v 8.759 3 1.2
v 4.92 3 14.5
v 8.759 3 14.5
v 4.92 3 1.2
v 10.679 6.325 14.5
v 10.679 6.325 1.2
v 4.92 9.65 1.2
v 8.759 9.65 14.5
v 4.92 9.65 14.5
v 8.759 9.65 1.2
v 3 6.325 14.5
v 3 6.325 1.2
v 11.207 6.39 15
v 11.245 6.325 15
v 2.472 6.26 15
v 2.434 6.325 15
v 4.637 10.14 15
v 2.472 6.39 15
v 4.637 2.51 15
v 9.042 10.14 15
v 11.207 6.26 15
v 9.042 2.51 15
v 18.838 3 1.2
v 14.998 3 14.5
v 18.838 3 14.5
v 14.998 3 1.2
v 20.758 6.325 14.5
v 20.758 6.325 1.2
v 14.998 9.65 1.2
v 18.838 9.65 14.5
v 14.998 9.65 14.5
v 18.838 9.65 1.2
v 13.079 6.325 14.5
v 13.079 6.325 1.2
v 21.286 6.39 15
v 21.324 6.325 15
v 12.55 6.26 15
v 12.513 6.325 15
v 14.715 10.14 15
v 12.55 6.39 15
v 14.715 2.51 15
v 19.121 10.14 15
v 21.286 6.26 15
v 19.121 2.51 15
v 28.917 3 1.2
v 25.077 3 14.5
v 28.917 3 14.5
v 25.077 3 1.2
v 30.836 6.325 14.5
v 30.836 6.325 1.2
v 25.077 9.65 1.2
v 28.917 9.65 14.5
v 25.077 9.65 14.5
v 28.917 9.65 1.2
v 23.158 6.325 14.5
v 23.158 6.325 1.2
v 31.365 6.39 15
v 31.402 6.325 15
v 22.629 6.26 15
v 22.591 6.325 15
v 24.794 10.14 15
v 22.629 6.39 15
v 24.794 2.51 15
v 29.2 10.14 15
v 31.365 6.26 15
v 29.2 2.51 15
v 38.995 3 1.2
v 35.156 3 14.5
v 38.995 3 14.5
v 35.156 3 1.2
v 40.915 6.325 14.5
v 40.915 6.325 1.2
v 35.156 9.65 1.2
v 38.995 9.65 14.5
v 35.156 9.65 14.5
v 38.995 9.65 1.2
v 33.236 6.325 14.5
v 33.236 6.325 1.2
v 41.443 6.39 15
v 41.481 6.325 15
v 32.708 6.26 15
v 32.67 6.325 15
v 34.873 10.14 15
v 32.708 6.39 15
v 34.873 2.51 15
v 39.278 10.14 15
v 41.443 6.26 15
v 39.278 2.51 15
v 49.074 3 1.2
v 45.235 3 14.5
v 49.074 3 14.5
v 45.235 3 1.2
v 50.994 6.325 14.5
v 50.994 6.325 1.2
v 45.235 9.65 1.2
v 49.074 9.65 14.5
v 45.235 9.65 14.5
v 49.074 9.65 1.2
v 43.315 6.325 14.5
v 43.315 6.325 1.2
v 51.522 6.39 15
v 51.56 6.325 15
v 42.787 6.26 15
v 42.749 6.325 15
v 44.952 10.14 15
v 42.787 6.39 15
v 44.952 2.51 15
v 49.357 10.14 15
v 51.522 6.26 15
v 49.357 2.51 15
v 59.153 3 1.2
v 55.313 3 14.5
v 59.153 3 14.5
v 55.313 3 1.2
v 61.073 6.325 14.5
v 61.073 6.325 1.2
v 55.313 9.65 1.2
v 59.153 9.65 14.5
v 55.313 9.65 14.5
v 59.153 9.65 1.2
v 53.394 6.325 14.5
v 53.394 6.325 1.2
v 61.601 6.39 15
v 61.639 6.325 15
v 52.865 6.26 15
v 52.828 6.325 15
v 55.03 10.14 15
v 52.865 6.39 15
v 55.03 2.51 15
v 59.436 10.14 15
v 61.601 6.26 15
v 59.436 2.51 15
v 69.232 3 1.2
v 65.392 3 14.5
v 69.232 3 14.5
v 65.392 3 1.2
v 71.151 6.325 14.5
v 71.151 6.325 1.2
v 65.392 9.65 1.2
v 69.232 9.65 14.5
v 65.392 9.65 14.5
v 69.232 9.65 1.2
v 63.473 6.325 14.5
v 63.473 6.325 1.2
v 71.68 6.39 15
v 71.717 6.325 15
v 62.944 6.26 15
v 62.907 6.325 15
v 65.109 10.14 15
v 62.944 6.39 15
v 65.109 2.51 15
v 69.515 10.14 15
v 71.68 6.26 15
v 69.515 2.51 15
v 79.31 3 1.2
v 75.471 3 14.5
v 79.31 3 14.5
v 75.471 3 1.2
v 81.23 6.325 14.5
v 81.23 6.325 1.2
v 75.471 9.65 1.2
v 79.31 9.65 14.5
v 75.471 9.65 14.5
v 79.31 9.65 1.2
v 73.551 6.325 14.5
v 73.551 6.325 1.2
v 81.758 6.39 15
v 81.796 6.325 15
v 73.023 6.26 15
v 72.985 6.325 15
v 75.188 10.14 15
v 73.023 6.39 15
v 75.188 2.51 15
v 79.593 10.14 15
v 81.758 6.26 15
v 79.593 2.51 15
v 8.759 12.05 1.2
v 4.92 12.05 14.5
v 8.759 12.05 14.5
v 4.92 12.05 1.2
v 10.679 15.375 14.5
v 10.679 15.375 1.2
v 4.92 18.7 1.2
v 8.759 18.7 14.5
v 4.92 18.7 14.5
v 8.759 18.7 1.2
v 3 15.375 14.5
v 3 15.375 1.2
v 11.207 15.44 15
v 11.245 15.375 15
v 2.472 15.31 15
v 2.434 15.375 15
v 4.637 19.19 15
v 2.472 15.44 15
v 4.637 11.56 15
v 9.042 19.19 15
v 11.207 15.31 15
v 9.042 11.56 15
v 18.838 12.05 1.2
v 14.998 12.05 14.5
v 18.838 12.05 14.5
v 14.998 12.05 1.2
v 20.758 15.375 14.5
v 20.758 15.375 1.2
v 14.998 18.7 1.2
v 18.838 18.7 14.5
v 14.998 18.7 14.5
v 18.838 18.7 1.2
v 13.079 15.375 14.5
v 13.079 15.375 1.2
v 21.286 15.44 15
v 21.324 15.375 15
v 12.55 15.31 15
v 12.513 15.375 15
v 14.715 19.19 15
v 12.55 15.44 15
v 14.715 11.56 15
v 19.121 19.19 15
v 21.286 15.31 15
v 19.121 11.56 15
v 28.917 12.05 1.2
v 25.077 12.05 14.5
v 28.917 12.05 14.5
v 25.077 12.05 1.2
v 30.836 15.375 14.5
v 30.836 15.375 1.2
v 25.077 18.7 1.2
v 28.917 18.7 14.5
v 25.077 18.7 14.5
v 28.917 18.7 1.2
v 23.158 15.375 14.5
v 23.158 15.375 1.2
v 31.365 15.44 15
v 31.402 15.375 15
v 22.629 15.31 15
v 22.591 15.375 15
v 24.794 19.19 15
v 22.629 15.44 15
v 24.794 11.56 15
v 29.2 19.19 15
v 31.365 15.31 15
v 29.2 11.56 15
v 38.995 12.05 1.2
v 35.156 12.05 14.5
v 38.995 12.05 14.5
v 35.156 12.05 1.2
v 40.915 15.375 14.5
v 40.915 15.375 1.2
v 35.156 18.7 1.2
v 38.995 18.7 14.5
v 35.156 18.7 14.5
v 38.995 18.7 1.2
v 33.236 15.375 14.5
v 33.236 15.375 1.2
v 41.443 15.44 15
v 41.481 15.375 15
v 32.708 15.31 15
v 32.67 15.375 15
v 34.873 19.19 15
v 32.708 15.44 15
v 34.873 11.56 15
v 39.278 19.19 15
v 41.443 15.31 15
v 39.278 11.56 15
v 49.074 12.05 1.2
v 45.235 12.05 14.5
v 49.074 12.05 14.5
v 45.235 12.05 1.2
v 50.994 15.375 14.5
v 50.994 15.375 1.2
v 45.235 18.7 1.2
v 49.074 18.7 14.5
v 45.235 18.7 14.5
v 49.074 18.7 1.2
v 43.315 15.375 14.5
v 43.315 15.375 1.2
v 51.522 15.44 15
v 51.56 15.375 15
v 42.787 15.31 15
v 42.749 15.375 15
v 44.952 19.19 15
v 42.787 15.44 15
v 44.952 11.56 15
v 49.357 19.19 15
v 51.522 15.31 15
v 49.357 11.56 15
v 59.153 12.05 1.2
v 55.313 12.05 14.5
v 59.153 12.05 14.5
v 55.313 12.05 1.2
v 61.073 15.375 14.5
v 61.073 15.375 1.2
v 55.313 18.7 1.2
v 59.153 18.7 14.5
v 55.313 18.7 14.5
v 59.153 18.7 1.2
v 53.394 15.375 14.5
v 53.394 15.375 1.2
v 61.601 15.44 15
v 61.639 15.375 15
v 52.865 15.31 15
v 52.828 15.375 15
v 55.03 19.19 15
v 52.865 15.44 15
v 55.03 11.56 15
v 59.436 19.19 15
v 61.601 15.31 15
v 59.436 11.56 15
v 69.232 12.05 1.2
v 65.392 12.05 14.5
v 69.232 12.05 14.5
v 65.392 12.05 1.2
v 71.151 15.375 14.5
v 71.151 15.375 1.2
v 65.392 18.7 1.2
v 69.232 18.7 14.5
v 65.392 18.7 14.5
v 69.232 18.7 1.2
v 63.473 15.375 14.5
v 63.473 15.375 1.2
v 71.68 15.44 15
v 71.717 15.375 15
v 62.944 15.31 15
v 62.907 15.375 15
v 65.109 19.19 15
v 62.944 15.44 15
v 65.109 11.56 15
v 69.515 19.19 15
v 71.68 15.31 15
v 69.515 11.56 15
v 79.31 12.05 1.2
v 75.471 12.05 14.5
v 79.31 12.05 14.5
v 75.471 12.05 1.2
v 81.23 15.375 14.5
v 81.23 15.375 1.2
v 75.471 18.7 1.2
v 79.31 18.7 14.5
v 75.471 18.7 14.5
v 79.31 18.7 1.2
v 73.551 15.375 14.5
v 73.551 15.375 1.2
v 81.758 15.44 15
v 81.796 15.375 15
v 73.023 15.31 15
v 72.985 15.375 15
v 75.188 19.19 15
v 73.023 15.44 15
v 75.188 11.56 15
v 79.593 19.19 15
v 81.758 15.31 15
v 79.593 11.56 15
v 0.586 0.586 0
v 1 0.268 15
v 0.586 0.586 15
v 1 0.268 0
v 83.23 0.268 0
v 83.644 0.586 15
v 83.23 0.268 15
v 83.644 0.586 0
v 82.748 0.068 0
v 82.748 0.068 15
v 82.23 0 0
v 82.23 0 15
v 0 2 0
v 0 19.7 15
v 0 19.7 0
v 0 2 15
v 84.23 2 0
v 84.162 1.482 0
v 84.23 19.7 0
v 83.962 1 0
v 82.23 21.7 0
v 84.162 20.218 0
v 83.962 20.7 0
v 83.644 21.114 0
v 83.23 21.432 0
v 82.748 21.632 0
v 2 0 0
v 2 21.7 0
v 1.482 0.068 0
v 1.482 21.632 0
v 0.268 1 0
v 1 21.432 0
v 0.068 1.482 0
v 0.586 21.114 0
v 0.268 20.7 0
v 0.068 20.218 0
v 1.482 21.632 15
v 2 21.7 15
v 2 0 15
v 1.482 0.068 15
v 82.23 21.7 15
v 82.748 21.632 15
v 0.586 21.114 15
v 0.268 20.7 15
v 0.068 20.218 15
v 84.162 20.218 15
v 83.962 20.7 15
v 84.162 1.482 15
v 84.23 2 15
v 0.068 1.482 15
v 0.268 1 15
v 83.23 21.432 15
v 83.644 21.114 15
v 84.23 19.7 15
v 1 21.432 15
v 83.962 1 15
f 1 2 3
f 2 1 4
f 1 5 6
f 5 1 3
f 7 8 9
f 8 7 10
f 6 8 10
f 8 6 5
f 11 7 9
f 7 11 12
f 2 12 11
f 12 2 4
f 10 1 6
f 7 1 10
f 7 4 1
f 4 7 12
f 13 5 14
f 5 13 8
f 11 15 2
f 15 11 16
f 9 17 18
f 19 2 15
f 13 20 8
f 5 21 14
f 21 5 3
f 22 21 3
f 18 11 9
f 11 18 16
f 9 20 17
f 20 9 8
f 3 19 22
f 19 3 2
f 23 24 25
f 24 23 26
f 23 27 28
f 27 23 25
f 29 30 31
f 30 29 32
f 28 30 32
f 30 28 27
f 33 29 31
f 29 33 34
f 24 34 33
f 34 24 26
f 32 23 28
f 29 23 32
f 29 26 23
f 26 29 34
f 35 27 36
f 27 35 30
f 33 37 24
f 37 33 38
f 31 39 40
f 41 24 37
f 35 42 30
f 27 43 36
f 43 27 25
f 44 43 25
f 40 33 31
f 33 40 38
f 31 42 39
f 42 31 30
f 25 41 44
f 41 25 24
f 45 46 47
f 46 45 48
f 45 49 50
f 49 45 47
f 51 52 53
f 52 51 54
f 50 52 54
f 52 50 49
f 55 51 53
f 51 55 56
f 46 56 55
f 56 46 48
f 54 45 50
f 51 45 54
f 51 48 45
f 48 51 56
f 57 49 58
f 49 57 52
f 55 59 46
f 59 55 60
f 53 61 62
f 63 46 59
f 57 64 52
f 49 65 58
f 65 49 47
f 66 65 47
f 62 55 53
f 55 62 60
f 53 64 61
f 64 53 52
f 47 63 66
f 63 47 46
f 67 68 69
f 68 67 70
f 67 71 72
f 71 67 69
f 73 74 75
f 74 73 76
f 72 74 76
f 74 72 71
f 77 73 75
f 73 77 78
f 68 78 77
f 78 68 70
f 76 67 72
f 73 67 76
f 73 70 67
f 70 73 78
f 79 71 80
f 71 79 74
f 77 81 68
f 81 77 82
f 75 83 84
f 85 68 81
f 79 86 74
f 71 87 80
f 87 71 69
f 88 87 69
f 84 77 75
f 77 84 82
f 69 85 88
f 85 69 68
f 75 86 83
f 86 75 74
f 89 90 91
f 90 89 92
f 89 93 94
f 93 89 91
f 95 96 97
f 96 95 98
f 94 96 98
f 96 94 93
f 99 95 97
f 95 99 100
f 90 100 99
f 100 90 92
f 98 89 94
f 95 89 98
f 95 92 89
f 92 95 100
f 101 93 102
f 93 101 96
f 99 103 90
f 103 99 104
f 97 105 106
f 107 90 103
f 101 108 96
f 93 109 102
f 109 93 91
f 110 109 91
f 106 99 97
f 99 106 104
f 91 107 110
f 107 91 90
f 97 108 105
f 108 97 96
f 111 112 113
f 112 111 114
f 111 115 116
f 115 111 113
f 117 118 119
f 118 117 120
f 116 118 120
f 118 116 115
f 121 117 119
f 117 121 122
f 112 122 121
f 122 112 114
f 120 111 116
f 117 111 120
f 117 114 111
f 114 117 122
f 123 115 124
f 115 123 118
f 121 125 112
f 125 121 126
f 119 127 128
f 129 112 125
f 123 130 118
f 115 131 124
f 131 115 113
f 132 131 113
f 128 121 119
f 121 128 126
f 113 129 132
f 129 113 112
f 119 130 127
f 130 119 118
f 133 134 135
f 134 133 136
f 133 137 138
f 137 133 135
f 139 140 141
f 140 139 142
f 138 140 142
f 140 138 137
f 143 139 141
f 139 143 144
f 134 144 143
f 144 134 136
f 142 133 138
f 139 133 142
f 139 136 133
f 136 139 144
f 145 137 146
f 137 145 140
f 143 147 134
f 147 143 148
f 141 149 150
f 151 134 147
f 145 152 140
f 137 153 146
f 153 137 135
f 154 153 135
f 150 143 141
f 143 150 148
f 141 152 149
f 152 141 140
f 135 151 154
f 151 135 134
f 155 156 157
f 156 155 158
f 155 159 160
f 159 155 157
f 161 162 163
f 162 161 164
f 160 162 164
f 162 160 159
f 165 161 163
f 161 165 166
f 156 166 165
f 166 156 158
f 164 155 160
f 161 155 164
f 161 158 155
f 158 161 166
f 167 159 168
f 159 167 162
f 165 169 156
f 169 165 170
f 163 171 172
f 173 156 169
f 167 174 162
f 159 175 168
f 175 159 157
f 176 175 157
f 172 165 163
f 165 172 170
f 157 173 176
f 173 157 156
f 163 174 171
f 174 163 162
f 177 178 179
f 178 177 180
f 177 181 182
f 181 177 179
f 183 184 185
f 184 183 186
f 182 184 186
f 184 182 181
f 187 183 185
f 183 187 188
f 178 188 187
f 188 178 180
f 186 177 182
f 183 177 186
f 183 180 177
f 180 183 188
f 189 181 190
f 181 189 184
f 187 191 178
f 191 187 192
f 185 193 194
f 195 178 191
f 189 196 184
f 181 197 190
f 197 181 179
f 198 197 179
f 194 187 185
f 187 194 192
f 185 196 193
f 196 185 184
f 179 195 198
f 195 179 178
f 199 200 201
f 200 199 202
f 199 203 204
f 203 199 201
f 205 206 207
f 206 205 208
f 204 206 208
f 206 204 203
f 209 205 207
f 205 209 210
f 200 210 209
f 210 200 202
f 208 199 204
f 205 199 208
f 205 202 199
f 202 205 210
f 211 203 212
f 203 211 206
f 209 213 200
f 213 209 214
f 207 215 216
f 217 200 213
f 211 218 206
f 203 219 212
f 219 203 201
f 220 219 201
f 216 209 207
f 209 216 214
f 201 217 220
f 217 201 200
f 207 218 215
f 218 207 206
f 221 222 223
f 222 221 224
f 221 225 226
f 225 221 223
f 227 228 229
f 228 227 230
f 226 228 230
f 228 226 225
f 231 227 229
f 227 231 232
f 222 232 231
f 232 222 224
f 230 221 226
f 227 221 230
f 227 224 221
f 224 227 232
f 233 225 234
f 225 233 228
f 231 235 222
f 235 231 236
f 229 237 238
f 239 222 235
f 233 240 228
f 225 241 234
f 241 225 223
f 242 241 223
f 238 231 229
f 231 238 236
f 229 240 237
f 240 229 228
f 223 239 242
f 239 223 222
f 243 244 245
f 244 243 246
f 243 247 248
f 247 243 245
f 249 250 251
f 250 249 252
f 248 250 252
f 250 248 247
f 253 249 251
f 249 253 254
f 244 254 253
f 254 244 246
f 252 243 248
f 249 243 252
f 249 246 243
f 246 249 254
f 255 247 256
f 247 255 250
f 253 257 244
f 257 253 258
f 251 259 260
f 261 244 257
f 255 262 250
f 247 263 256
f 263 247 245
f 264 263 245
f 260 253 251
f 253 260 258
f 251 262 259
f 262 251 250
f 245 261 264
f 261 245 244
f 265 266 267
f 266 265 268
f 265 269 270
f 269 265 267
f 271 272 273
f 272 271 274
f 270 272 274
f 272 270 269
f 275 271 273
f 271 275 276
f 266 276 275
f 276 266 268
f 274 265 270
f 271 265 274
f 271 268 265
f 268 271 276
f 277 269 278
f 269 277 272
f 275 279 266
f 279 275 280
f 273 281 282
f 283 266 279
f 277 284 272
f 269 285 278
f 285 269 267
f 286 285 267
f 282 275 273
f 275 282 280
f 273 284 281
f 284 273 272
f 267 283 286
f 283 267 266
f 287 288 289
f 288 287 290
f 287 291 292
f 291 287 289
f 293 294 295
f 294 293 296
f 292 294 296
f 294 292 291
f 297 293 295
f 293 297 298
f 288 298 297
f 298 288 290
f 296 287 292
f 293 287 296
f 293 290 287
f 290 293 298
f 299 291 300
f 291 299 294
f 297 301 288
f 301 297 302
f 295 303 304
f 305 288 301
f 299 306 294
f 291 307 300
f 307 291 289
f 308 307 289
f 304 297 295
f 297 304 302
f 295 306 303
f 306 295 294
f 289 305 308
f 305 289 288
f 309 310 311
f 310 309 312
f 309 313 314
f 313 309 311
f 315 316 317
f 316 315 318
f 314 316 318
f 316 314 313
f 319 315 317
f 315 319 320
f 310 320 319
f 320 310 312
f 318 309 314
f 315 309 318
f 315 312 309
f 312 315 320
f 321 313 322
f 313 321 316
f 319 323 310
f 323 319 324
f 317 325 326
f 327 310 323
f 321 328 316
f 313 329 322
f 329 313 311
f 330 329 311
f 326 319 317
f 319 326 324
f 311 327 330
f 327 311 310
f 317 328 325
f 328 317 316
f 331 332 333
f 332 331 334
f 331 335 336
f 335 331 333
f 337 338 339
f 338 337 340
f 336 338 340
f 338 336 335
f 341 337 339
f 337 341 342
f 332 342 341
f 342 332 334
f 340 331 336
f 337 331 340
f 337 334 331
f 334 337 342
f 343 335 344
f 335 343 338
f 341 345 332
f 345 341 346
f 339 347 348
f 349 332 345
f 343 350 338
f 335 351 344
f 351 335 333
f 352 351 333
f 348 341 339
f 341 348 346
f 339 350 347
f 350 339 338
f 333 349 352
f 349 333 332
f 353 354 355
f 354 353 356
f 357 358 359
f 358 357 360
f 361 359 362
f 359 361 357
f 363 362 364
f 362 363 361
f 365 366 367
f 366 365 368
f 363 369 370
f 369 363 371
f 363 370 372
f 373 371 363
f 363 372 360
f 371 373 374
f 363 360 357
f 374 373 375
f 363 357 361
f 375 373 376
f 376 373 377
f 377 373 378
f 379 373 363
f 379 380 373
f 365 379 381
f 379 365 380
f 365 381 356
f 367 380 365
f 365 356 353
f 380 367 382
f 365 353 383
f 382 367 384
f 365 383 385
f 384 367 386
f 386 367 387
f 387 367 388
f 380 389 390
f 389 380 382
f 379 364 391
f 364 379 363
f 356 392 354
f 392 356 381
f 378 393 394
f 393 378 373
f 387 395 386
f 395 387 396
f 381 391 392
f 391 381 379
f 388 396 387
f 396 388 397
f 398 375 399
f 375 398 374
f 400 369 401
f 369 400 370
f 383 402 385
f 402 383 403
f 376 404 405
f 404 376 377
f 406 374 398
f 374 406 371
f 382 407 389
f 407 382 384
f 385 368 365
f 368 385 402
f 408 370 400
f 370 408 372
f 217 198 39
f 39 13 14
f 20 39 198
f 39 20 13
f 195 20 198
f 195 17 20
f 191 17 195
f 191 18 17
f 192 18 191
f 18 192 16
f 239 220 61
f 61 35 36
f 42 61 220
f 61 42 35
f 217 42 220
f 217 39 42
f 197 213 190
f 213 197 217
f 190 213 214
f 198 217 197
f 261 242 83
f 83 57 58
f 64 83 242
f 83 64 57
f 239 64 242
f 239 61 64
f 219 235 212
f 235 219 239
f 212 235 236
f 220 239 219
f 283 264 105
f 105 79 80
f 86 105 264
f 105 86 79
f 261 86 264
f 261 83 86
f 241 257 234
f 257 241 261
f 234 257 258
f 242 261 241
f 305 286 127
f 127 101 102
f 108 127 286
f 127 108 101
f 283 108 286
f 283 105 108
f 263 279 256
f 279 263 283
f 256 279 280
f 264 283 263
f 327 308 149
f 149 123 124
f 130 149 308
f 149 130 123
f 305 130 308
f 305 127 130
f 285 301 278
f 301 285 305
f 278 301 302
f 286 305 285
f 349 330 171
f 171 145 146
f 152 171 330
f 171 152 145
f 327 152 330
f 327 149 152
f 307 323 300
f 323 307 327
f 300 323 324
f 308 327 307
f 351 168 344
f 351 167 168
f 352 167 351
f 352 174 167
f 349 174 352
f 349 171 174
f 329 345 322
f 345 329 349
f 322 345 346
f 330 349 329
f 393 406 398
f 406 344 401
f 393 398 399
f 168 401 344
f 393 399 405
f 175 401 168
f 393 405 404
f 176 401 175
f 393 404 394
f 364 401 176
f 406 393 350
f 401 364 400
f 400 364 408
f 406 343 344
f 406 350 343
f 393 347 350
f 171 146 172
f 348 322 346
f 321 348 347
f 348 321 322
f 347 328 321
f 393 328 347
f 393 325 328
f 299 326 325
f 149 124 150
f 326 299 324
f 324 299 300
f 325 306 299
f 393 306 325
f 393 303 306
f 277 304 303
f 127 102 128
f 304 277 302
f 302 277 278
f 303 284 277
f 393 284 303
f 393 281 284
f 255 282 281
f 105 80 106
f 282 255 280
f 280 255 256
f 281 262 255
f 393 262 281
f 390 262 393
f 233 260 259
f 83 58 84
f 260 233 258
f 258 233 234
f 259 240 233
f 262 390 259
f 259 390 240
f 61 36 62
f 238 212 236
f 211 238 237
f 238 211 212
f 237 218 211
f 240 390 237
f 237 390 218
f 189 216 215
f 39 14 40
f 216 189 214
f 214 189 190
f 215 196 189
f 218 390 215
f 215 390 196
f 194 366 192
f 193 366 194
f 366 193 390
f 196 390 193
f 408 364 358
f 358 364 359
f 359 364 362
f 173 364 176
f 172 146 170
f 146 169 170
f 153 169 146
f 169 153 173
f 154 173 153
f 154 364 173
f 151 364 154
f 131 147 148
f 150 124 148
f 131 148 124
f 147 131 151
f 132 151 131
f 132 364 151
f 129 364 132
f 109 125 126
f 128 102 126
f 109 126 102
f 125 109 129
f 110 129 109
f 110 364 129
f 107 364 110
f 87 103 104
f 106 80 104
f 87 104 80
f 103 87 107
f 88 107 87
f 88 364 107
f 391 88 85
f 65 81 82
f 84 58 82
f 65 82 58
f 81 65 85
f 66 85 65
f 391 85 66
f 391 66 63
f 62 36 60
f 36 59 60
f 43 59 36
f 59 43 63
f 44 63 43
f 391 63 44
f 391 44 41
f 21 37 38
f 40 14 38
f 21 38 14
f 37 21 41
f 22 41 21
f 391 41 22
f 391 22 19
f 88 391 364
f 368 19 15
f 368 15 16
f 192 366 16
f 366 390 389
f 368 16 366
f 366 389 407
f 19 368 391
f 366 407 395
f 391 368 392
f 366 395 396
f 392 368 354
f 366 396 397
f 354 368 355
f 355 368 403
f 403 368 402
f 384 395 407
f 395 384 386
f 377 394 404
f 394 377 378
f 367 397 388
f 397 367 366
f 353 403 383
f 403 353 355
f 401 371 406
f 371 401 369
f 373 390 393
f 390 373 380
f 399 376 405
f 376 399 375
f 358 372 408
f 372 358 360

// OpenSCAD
// Hex Bit Holder, OpenSCAD version of the web app. Paste the "Copy OpenSCAD settings" block over the settings below.
// Rows run front to back; holes in a row run left to right. All dimensions in mm.

/* [Rows] */
// [bit size across the flats, holes] per row, front row first
rows = [[6.35, 8], [6.35, 8]];
// one text per hole, front row first, left to right ("" for none)
labels = [[], []];

/* [Holder] */
height = 15;
// holes go all the way through
through = false;
// floor under each hole when not through
floor_t = 1.2;
// flared mouth on each hole, so bits find their way in
chamfer = 0.5;
// cut a slot along each row so the holes can flex
slots = false;
// slot depth as a share of the height
slot_pct = 75;
slot_w = 1.6;
corner_r = 2;

/* [Fit and print] */
// added to each side of every hole
clearance = 0.15;
// web between holes
wall = 2.4;
// from the outer holes to the edge
edge = 3;
label_cap = 3;
label_raise = 0.5;

/* [Hidden] */
$fn = 24;
n_rows = len(rows);
flare = max(0, min(chamfer, 0.4 * wall, edge - 0.5));
function ir(k) = (rows[k][0] + 2 * clearance) / 2;           // inradius of the holes in row k
function R(k) = ir(k) / cos(30);                               // circumradius
function pitch(k) = 2 * R(k) + wall;
function span(k) = (rows[k][1] - 1) * pitch(k) + 2 * R(k);
function has_labels(k) = k < len(labels) && len([for (t = labels[k]) if (t != "") t]) > 0;
function band(k) = has_labels(k) ? label_cap + 1.2 + flare : 0;
function row_y(k) = k == 0 ? edge + band(0) + ir(0) : row_y(k - 1) + ir(k - 1) + wall + band(k) + ir(k);
W = max([for (k = [0 : n_rows - 1]) span(k)]) + 2 * edge;
D = row_y(n_rows - 1) + ir(n_rows - 1) + edge;
z_floor = through ? 0 : floor_t;
slot_depth = max(flare + 0.3, min(height * slot_pct / 100, height - z_floor - 0.5));

module hex(r, h) { cylinder(r = r, h = h, $fn = 6); } // points along x, flats along y
module body() {
  linear_extrude(height) offset(r = corner_r) offset(delta = -corner_r) square([W, D]);
}
module holes() {
  for (k = [0 : n_rows - 1]) {
    x0 = (W - span(k)) / 2 + R(k);
    for (j = [0 : rows[k][1] - 1]) translate([x0 + j * pitch(k), row_y(k), 0]) {
      translate([0, 0, z_floor]) hex(R(k), height);
      if (flare > 0) translate([0, 0, height - flare]) cylinder(r1 = R(k), r2 = (ir(k) + flare) / cos(30), h = flare + 0.01, $fn = 6);
    }
    if (slots) translate([-1, row_y(k) - slot_w / 2, height - slot_depth]) cube([W + 2, slot_w, slot_depth + 1]);
  }
}
module letters() {
  for (k = [0 : n_rows - 1]) if (has_labels(k)) {
    x0 = (W - span(k)) / 2 + R(k);
    for (j = [0 : rows[k][1] - 1]) if (j < len(labels[k]) && labels[k][j] != "")
      translate([x0 + j * pitch(k), row_y(k) - ir(k) - flare - 0.6 - label_cap / 2, height - 0.3])
        linear_extrude(label_raise + 0.3) resize([min(pitch(k) - 1, 0.8 * label_cap * len(labels[k][j])), 0], auto = true)
          text(labels[k][j], size = label_cap, halign = "center", valign = "center", font = "Liberation Sans:style=Bold");
  }
}

difference() { body(); holes(); }
letters();
